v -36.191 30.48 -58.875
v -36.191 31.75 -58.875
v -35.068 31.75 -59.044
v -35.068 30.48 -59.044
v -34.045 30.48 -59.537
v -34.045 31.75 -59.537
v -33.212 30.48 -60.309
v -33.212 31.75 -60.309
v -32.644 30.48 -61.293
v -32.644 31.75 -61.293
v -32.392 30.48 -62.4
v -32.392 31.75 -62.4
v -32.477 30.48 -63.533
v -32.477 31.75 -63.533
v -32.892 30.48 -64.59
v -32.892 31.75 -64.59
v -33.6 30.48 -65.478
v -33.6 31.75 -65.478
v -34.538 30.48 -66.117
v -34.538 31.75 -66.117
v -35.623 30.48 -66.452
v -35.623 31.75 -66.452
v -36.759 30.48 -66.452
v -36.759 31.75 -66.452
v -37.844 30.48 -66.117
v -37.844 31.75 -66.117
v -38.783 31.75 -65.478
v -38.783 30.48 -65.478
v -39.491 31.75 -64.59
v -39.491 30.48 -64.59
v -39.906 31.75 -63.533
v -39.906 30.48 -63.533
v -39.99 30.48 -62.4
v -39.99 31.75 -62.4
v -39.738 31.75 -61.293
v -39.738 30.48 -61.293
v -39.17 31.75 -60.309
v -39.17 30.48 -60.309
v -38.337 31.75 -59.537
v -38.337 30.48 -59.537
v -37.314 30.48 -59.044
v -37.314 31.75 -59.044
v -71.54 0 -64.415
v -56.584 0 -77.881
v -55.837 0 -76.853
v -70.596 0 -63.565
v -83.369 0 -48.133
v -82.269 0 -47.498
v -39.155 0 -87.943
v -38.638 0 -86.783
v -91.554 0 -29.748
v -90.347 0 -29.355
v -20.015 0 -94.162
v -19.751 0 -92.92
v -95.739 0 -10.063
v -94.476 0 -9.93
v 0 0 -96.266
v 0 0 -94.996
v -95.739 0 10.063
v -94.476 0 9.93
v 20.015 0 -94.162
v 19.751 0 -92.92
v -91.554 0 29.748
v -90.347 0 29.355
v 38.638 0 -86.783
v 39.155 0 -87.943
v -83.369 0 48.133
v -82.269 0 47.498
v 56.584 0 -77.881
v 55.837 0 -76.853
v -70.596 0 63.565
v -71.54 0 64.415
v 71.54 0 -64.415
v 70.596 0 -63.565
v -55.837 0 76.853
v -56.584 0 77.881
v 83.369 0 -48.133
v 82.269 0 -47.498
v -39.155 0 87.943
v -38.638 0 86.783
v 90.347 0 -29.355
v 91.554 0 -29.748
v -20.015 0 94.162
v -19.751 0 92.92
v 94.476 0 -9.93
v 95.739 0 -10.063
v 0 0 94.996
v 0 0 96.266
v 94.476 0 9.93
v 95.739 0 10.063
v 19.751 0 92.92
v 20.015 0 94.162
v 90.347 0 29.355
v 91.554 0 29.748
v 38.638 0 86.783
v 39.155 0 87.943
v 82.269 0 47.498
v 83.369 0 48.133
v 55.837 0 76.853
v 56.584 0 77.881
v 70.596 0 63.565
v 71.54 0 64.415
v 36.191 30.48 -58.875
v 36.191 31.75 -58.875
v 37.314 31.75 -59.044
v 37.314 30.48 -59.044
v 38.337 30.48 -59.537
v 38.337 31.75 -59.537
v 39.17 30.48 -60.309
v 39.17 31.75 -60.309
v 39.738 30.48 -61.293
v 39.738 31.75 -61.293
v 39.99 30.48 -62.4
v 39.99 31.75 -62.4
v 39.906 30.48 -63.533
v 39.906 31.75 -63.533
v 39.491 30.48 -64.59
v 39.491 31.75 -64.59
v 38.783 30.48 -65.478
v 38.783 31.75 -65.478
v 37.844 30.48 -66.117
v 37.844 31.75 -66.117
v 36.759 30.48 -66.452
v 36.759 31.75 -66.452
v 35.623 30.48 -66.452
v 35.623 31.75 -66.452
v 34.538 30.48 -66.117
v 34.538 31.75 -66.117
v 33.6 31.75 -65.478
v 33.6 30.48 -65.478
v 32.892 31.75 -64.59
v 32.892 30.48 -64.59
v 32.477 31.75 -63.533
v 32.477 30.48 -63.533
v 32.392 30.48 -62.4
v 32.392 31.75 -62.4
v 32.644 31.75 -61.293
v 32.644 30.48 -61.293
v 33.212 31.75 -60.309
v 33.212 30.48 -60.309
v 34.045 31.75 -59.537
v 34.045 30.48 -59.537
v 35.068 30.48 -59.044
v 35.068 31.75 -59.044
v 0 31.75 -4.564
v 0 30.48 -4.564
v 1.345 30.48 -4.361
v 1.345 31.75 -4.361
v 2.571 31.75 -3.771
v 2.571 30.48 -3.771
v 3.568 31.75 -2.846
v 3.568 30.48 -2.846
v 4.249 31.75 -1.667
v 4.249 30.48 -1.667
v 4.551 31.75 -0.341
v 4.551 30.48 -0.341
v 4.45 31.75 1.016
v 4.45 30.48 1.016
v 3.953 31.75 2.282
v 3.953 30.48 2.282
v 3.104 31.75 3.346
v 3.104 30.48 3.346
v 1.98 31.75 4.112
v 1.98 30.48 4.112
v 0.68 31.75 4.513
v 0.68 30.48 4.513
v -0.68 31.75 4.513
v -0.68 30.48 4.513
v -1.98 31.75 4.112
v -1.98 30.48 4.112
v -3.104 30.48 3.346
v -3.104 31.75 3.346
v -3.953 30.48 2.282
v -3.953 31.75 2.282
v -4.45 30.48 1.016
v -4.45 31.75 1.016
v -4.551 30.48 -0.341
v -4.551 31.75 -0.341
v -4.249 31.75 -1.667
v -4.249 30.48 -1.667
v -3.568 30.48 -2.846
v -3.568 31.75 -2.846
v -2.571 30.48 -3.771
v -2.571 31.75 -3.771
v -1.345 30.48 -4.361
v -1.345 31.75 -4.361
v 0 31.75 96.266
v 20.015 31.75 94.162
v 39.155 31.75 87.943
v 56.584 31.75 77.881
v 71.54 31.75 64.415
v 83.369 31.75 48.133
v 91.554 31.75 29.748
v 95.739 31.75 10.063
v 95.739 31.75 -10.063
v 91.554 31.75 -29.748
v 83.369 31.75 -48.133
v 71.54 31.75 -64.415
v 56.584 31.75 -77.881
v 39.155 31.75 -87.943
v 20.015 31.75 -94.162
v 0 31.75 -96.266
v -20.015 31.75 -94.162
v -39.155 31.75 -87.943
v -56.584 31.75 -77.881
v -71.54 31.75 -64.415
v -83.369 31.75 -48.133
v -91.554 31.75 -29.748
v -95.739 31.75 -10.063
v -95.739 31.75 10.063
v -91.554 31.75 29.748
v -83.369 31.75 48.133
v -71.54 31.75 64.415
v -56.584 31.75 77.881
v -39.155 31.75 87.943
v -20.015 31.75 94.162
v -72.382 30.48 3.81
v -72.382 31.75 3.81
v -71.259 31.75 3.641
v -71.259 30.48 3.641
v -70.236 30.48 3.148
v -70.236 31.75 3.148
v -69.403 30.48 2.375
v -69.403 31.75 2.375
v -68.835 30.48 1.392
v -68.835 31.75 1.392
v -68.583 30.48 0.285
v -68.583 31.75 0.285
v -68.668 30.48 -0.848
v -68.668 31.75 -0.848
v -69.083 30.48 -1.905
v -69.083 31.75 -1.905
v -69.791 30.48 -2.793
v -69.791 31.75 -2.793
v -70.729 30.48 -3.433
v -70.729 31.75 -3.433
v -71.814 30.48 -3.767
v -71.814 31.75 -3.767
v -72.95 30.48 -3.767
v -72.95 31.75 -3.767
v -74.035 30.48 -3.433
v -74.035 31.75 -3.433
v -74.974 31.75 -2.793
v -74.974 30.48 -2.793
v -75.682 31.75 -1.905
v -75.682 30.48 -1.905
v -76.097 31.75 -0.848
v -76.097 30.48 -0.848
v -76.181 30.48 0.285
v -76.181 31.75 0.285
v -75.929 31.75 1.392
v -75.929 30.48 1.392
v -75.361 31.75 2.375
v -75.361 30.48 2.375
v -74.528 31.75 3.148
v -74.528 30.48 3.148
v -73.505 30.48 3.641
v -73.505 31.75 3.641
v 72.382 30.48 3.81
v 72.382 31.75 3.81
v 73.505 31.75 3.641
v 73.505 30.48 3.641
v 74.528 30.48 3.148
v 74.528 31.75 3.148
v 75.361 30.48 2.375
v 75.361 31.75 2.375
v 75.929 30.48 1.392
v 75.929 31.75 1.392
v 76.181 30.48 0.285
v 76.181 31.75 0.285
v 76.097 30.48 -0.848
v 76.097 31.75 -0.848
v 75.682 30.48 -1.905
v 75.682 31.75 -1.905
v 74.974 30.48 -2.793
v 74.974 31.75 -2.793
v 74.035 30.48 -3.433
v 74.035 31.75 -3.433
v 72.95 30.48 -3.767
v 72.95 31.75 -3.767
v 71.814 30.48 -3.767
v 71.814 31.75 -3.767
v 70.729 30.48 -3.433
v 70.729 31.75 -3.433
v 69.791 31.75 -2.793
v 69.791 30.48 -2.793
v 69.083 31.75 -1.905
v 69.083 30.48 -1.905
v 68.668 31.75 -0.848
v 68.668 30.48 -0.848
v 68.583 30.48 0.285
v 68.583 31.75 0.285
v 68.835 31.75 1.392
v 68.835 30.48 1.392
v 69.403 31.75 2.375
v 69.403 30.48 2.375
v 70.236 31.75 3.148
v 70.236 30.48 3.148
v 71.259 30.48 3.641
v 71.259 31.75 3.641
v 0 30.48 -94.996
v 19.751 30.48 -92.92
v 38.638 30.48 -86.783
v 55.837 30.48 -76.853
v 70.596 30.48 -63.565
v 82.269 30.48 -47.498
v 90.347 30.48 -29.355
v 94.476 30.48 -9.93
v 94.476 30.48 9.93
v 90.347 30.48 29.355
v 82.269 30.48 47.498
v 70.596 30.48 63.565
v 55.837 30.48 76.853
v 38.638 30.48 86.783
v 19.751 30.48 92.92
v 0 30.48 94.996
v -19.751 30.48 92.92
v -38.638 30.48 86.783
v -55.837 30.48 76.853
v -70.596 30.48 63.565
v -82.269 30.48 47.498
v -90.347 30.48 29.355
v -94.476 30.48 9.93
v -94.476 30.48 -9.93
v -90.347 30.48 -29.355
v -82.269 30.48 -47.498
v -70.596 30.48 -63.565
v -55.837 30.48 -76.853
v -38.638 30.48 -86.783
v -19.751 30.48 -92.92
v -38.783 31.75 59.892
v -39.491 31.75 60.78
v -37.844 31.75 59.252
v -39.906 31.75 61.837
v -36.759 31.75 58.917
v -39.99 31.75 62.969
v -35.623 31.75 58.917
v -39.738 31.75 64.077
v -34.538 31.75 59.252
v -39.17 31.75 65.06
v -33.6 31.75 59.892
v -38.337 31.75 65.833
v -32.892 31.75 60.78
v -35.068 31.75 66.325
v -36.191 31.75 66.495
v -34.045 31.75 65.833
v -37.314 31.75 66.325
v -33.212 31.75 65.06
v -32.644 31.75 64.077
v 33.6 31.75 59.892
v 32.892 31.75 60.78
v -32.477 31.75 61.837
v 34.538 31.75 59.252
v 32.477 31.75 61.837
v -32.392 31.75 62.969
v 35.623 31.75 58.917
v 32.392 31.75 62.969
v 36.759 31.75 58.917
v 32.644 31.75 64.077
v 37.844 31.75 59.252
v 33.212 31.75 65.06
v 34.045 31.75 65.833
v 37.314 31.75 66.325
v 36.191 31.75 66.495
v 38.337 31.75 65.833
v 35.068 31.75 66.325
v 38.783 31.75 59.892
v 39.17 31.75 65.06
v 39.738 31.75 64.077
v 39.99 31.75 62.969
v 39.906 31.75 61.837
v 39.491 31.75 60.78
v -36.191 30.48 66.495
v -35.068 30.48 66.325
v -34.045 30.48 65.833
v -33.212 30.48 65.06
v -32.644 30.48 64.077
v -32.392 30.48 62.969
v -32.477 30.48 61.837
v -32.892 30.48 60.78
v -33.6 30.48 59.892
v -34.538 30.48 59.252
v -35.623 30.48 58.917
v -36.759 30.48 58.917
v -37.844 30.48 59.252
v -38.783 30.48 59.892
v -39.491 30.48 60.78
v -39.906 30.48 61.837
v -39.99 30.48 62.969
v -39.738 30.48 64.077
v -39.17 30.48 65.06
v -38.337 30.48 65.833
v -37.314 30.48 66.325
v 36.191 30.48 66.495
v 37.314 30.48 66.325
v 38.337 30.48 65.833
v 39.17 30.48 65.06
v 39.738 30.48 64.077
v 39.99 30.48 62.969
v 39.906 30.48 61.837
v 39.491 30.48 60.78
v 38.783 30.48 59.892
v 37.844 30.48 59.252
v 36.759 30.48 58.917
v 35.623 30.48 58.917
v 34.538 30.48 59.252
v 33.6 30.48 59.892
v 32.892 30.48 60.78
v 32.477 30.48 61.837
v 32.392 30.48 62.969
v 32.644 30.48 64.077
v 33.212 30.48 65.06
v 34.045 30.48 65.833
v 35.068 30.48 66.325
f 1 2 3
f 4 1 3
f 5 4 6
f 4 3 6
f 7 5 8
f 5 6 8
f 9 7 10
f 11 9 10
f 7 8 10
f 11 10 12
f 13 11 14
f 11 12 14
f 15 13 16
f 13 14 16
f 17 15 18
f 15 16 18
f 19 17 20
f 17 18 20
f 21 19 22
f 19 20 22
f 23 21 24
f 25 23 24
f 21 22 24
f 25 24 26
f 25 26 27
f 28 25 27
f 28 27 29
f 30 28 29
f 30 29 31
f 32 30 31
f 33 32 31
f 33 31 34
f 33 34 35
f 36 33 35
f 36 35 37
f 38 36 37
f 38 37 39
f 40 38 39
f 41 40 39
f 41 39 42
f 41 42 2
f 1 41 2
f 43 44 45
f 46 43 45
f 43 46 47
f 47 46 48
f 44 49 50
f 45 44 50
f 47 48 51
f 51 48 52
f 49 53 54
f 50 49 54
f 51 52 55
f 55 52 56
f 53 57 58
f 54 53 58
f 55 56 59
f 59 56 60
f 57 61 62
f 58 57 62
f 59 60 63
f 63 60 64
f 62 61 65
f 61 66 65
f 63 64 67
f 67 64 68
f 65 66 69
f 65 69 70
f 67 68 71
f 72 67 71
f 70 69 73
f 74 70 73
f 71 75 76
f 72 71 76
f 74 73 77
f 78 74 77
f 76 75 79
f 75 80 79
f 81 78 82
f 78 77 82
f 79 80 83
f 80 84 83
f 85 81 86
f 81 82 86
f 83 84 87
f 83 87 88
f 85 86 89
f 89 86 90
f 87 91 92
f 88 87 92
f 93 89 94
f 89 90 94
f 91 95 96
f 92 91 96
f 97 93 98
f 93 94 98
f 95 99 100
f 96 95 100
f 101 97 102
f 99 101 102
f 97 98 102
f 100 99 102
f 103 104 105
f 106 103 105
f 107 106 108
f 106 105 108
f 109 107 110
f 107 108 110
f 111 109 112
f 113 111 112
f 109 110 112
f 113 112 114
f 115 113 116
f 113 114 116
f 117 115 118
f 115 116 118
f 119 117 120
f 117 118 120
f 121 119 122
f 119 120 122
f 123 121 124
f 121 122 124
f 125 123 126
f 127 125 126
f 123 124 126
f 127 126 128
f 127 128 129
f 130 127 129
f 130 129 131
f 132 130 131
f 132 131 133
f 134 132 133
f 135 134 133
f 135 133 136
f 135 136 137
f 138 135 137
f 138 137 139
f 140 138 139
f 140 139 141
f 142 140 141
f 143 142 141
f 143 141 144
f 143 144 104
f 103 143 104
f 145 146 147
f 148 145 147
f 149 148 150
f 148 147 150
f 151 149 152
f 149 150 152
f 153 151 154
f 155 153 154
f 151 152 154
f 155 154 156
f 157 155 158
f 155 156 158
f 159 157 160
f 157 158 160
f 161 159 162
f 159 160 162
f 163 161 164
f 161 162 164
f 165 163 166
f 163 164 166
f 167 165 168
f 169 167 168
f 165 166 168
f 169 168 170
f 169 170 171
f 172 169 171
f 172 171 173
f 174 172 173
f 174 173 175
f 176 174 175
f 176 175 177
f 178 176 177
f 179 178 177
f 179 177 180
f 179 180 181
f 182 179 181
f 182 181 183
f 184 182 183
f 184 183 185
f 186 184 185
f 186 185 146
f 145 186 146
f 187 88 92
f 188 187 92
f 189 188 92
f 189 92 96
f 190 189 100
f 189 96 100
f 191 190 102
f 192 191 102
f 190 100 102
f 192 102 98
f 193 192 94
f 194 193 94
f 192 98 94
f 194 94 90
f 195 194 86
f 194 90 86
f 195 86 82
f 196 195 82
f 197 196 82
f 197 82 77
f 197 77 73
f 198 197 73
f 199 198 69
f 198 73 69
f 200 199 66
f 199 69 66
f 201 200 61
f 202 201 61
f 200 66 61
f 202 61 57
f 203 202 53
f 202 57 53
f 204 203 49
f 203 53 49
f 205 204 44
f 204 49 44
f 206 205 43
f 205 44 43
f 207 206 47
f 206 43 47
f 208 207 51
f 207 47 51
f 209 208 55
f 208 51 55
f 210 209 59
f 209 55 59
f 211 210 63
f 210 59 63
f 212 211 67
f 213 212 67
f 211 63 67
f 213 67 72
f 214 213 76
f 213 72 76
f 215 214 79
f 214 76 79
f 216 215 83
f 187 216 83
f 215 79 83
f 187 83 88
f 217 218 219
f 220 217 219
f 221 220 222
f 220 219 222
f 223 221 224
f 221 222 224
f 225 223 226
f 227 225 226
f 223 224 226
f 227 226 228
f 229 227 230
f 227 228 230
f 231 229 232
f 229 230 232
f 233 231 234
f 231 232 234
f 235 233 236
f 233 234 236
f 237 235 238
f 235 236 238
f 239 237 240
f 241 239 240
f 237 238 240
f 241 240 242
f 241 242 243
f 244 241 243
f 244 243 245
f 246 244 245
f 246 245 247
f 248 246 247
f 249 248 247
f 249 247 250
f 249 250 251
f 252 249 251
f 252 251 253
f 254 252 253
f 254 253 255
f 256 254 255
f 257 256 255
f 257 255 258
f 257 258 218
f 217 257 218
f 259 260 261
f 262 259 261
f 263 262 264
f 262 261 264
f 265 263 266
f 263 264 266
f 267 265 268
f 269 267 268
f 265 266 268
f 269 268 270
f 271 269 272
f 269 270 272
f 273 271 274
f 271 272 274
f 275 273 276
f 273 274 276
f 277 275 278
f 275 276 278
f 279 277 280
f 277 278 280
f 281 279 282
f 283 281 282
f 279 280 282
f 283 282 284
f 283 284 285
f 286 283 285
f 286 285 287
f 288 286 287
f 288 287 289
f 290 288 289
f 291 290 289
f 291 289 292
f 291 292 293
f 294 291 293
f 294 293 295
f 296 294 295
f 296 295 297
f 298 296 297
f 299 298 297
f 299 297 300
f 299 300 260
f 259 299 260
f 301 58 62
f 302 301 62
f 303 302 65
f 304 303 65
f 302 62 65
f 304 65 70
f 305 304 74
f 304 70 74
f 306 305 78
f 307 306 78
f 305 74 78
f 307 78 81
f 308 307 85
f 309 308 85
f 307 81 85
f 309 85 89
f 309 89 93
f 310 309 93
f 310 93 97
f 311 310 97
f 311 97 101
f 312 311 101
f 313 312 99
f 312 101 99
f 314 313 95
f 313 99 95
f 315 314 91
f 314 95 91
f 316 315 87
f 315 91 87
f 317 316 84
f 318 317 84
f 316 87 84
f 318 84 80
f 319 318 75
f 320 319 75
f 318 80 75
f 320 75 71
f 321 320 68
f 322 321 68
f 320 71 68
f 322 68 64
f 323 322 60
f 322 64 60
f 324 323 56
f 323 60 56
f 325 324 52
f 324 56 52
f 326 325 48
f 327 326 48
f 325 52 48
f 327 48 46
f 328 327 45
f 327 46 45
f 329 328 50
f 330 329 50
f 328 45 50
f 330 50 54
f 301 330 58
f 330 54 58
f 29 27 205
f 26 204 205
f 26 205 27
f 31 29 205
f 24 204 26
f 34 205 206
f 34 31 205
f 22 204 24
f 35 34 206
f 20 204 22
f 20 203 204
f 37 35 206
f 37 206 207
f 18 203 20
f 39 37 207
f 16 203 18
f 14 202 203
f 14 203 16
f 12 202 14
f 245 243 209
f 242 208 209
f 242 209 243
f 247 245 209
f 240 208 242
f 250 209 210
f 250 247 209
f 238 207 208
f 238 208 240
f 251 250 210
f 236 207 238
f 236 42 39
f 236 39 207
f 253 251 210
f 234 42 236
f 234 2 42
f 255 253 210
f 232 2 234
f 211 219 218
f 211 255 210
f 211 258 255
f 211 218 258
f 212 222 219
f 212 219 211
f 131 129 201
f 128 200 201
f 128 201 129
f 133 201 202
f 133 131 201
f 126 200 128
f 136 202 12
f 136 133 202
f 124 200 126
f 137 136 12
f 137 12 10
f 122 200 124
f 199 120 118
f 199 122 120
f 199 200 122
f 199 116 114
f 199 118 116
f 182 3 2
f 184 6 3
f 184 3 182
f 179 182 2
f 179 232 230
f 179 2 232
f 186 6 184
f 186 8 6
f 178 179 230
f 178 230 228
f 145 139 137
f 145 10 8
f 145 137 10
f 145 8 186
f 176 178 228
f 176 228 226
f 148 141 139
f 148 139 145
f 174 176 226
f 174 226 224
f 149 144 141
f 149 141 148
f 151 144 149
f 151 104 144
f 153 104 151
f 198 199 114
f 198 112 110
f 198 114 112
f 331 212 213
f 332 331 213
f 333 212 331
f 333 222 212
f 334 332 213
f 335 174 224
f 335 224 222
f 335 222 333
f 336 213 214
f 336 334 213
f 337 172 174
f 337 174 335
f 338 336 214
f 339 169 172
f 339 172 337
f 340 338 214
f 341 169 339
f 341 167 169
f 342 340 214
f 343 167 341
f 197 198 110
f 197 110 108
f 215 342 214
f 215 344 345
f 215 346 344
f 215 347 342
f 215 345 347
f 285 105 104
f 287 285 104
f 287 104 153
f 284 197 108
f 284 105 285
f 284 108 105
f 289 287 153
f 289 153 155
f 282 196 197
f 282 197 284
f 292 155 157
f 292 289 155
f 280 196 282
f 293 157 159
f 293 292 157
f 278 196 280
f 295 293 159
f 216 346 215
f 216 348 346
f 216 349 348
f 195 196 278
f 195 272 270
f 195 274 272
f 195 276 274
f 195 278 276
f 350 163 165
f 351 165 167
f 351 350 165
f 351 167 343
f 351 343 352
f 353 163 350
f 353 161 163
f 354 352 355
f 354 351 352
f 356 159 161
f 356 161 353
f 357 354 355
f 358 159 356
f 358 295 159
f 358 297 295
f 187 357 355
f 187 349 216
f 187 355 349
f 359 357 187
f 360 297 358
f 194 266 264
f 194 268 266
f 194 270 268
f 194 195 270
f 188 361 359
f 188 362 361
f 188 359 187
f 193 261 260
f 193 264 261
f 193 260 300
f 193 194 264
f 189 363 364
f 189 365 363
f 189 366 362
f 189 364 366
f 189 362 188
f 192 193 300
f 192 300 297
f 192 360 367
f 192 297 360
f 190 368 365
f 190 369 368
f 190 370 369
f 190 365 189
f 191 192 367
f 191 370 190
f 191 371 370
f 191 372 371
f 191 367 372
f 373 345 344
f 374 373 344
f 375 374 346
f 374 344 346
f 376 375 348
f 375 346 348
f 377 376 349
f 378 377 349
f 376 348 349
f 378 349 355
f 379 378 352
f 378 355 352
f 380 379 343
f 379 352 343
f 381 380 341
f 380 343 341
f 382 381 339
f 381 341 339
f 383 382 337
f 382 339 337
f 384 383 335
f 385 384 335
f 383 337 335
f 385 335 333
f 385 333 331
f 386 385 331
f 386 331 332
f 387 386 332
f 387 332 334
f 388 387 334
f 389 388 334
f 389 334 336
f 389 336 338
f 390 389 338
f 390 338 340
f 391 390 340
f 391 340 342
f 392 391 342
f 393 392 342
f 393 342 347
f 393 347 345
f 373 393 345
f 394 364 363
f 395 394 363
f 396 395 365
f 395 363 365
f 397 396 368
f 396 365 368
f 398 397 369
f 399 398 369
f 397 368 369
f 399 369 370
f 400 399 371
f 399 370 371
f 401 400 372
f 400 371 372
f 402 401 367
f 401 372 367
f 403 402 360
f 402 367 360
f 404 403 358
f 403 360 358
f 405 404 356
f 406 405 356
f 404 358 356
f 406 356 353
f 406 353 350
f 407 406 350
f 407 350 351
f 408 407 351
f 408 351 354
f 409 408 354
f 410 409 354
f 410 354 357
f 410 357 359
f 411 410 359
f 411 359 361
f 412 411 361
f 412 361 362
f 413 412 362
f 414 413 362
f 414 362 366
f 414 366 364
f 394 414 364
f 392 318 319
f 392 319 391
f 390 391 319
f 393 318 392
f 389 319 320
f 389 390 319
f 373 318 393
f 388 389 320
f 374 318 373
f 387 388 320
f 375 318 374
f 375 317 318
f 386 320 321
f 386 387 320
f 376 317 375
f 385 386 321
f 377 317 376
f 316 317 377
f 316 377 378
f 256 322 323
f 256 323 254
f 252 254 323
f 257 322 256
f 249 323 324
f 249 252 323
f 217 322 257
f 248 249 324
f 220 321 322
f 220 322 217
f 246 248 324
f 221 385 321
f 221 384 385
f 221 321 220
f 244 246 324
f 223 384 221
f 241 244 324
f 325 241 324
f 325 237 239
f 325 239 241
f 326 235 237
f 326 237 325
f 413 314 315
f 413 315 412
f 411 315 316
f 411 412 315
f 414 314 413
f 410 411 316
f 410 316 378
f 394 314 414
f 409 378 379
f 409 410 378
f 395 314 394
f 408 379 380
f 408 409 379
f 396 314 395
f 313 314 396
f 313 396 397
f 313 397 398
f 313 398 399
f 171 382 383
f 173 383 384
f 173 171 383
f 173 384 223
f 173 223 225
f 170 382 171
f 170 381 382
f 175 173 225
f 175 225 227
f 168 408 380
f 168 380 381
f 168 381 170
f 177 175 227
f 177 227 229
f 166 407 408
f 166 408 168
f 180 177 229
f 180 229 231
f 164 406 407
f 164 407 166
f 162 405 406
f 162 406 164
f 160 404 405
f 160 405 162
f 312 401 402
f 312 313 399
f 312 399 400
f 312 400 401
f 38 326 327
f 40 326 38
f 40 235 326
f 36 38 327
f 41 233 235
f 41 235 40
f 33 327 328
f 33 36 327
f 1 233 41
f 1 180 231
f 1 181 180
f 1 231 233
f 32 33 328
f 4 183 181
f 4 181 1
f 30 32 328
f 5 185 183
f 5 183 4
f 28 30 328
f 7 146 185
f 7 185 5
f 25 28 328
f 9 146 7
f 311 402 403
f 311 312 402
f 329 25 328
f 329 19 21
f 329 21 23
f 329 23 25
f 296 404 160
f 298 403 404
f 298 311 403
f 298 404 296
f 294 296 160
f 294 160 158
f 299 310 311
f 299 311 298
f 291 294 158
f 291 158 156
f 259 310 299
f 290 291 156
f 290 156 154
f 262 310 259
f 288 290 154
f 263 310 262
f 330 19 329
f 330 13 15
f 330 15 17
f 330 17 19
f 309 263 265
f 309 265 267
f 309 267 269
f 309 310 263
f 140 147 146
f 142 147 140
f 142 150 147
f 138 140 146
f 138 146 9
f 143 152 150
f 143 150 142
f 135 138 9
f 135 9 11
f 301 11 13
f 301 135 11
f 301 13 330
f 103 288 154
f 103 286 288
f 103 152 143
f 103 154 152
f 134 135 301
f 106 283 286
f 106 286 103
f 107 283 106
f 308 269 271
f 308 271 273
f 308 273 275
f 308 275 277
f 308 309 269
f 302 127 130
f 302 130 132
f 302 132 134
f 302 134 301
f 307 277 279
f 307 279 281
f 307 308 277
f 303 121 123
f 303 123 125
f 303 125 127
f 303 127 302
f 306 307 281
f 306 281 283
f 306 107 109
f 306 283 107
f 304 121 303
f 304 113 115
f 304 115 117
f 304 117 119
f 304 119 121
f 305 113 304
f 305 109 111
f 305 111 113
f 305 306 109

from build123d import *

# Parameters (mm, degrees)
SKETCH1_R                                  = 96.266
BOSS_EXTRUDE1_DEPTH                        = 31.75
SKETCH2_R                                  = 94.996
CUT_EXTRUDE1_DEPTH                         = 30.48
F_23_64_0_35938_DIAMETER_HOLE1_D           = 9.128252
F_23_64_0_35938_DIAMETER_HOLE1_ON_FACE_2_D = 9.128252
SKETCH5_R                                  = 3.81
CUT_EXTRUDE2_DEPTH                         = 22.86


with BuildPart() as part:
    # Sketch1 → Boss-Extrude1 (new body)
    with BuildSketch(Plane(origin=(0, 0, 0), x_dir=(1, 0, 0), z_dir=(0, 1, 0))):
        with Locations(Location((0, 0, 0), (0, 0, 270))):
            Circle(SKETCH1_R)
    extrude(amount=BOSS_EXTRUDE1_DEPTH)

    # Sketch2 → Cut-Extrude1 (cut)
    with BuildSketch(Plane.XZ):
        with Locations(Location((0, 0, 0), (0, 0, 270))):
            Circle(SKETCH2_R)
    extrude(amount=-CUT_EXTRUDE1_DEPTH, mode=Mode.SUBTRACT)

    # 23/64 (0.35938) Diameter Hole1 (through all)
    with Locations(Plane(origin=(1.163e-06, 31.75, -2.517e-06), x_dir=(0, 0, 1), z_dir=(0, 1, 0))):
        with Locations((0, 0)):
            Hole(F_23_64_0_35938_DIAMETER_HOLE1_D / 2)

    # 23/64 (0.35938) Diameter Hole1 on face 2 (through all)
    with Locations(Plane.ZX):
        with Locations((0, 0)):
            Hole(F_23_64_0_35938_DIAMETER_HOLE1_ON_FACE_2_D / 2)

    # Sketch5 → Cut-Extrude2 (cut)
    with BuildSketch(Plane(origin=(0, 31.75, 0), x_dir=(1, 0, 0), z_dir=(0, 1, 0))):
        with Locations(Location((72.382124837, 0, 0), (0, 0, 270))):
            Circle(SKETCH5_R)
        with Locations(Location((36.191062419, 62.684758889, 0), (0, 0, 270))):
            Circle(SKETCH5_R)
        with Locations(Location((-36.191062419, 62.684758889, 0), (0, 0, 270))):
            Circle(SKETCH5_R)
        with Locations(Location((-72.382124837, 0, 0), (0, 0, 270))):
            Circle(SKETCH5_R)
        with Locations(Location((-36.191062419, -62.684758889, 0), (0, 0, 270))):
            Circle(SKETCH5_R)
        with Locations(Location((36.191062419, -62.684758889, 0), (0, 0, 270))):
            Circle(SKETCH5_R)
    extrude(amount=-CUT_EXTRUDE2_DEPTH, mode=Mode.SUBTRACT)


solid = part.part
